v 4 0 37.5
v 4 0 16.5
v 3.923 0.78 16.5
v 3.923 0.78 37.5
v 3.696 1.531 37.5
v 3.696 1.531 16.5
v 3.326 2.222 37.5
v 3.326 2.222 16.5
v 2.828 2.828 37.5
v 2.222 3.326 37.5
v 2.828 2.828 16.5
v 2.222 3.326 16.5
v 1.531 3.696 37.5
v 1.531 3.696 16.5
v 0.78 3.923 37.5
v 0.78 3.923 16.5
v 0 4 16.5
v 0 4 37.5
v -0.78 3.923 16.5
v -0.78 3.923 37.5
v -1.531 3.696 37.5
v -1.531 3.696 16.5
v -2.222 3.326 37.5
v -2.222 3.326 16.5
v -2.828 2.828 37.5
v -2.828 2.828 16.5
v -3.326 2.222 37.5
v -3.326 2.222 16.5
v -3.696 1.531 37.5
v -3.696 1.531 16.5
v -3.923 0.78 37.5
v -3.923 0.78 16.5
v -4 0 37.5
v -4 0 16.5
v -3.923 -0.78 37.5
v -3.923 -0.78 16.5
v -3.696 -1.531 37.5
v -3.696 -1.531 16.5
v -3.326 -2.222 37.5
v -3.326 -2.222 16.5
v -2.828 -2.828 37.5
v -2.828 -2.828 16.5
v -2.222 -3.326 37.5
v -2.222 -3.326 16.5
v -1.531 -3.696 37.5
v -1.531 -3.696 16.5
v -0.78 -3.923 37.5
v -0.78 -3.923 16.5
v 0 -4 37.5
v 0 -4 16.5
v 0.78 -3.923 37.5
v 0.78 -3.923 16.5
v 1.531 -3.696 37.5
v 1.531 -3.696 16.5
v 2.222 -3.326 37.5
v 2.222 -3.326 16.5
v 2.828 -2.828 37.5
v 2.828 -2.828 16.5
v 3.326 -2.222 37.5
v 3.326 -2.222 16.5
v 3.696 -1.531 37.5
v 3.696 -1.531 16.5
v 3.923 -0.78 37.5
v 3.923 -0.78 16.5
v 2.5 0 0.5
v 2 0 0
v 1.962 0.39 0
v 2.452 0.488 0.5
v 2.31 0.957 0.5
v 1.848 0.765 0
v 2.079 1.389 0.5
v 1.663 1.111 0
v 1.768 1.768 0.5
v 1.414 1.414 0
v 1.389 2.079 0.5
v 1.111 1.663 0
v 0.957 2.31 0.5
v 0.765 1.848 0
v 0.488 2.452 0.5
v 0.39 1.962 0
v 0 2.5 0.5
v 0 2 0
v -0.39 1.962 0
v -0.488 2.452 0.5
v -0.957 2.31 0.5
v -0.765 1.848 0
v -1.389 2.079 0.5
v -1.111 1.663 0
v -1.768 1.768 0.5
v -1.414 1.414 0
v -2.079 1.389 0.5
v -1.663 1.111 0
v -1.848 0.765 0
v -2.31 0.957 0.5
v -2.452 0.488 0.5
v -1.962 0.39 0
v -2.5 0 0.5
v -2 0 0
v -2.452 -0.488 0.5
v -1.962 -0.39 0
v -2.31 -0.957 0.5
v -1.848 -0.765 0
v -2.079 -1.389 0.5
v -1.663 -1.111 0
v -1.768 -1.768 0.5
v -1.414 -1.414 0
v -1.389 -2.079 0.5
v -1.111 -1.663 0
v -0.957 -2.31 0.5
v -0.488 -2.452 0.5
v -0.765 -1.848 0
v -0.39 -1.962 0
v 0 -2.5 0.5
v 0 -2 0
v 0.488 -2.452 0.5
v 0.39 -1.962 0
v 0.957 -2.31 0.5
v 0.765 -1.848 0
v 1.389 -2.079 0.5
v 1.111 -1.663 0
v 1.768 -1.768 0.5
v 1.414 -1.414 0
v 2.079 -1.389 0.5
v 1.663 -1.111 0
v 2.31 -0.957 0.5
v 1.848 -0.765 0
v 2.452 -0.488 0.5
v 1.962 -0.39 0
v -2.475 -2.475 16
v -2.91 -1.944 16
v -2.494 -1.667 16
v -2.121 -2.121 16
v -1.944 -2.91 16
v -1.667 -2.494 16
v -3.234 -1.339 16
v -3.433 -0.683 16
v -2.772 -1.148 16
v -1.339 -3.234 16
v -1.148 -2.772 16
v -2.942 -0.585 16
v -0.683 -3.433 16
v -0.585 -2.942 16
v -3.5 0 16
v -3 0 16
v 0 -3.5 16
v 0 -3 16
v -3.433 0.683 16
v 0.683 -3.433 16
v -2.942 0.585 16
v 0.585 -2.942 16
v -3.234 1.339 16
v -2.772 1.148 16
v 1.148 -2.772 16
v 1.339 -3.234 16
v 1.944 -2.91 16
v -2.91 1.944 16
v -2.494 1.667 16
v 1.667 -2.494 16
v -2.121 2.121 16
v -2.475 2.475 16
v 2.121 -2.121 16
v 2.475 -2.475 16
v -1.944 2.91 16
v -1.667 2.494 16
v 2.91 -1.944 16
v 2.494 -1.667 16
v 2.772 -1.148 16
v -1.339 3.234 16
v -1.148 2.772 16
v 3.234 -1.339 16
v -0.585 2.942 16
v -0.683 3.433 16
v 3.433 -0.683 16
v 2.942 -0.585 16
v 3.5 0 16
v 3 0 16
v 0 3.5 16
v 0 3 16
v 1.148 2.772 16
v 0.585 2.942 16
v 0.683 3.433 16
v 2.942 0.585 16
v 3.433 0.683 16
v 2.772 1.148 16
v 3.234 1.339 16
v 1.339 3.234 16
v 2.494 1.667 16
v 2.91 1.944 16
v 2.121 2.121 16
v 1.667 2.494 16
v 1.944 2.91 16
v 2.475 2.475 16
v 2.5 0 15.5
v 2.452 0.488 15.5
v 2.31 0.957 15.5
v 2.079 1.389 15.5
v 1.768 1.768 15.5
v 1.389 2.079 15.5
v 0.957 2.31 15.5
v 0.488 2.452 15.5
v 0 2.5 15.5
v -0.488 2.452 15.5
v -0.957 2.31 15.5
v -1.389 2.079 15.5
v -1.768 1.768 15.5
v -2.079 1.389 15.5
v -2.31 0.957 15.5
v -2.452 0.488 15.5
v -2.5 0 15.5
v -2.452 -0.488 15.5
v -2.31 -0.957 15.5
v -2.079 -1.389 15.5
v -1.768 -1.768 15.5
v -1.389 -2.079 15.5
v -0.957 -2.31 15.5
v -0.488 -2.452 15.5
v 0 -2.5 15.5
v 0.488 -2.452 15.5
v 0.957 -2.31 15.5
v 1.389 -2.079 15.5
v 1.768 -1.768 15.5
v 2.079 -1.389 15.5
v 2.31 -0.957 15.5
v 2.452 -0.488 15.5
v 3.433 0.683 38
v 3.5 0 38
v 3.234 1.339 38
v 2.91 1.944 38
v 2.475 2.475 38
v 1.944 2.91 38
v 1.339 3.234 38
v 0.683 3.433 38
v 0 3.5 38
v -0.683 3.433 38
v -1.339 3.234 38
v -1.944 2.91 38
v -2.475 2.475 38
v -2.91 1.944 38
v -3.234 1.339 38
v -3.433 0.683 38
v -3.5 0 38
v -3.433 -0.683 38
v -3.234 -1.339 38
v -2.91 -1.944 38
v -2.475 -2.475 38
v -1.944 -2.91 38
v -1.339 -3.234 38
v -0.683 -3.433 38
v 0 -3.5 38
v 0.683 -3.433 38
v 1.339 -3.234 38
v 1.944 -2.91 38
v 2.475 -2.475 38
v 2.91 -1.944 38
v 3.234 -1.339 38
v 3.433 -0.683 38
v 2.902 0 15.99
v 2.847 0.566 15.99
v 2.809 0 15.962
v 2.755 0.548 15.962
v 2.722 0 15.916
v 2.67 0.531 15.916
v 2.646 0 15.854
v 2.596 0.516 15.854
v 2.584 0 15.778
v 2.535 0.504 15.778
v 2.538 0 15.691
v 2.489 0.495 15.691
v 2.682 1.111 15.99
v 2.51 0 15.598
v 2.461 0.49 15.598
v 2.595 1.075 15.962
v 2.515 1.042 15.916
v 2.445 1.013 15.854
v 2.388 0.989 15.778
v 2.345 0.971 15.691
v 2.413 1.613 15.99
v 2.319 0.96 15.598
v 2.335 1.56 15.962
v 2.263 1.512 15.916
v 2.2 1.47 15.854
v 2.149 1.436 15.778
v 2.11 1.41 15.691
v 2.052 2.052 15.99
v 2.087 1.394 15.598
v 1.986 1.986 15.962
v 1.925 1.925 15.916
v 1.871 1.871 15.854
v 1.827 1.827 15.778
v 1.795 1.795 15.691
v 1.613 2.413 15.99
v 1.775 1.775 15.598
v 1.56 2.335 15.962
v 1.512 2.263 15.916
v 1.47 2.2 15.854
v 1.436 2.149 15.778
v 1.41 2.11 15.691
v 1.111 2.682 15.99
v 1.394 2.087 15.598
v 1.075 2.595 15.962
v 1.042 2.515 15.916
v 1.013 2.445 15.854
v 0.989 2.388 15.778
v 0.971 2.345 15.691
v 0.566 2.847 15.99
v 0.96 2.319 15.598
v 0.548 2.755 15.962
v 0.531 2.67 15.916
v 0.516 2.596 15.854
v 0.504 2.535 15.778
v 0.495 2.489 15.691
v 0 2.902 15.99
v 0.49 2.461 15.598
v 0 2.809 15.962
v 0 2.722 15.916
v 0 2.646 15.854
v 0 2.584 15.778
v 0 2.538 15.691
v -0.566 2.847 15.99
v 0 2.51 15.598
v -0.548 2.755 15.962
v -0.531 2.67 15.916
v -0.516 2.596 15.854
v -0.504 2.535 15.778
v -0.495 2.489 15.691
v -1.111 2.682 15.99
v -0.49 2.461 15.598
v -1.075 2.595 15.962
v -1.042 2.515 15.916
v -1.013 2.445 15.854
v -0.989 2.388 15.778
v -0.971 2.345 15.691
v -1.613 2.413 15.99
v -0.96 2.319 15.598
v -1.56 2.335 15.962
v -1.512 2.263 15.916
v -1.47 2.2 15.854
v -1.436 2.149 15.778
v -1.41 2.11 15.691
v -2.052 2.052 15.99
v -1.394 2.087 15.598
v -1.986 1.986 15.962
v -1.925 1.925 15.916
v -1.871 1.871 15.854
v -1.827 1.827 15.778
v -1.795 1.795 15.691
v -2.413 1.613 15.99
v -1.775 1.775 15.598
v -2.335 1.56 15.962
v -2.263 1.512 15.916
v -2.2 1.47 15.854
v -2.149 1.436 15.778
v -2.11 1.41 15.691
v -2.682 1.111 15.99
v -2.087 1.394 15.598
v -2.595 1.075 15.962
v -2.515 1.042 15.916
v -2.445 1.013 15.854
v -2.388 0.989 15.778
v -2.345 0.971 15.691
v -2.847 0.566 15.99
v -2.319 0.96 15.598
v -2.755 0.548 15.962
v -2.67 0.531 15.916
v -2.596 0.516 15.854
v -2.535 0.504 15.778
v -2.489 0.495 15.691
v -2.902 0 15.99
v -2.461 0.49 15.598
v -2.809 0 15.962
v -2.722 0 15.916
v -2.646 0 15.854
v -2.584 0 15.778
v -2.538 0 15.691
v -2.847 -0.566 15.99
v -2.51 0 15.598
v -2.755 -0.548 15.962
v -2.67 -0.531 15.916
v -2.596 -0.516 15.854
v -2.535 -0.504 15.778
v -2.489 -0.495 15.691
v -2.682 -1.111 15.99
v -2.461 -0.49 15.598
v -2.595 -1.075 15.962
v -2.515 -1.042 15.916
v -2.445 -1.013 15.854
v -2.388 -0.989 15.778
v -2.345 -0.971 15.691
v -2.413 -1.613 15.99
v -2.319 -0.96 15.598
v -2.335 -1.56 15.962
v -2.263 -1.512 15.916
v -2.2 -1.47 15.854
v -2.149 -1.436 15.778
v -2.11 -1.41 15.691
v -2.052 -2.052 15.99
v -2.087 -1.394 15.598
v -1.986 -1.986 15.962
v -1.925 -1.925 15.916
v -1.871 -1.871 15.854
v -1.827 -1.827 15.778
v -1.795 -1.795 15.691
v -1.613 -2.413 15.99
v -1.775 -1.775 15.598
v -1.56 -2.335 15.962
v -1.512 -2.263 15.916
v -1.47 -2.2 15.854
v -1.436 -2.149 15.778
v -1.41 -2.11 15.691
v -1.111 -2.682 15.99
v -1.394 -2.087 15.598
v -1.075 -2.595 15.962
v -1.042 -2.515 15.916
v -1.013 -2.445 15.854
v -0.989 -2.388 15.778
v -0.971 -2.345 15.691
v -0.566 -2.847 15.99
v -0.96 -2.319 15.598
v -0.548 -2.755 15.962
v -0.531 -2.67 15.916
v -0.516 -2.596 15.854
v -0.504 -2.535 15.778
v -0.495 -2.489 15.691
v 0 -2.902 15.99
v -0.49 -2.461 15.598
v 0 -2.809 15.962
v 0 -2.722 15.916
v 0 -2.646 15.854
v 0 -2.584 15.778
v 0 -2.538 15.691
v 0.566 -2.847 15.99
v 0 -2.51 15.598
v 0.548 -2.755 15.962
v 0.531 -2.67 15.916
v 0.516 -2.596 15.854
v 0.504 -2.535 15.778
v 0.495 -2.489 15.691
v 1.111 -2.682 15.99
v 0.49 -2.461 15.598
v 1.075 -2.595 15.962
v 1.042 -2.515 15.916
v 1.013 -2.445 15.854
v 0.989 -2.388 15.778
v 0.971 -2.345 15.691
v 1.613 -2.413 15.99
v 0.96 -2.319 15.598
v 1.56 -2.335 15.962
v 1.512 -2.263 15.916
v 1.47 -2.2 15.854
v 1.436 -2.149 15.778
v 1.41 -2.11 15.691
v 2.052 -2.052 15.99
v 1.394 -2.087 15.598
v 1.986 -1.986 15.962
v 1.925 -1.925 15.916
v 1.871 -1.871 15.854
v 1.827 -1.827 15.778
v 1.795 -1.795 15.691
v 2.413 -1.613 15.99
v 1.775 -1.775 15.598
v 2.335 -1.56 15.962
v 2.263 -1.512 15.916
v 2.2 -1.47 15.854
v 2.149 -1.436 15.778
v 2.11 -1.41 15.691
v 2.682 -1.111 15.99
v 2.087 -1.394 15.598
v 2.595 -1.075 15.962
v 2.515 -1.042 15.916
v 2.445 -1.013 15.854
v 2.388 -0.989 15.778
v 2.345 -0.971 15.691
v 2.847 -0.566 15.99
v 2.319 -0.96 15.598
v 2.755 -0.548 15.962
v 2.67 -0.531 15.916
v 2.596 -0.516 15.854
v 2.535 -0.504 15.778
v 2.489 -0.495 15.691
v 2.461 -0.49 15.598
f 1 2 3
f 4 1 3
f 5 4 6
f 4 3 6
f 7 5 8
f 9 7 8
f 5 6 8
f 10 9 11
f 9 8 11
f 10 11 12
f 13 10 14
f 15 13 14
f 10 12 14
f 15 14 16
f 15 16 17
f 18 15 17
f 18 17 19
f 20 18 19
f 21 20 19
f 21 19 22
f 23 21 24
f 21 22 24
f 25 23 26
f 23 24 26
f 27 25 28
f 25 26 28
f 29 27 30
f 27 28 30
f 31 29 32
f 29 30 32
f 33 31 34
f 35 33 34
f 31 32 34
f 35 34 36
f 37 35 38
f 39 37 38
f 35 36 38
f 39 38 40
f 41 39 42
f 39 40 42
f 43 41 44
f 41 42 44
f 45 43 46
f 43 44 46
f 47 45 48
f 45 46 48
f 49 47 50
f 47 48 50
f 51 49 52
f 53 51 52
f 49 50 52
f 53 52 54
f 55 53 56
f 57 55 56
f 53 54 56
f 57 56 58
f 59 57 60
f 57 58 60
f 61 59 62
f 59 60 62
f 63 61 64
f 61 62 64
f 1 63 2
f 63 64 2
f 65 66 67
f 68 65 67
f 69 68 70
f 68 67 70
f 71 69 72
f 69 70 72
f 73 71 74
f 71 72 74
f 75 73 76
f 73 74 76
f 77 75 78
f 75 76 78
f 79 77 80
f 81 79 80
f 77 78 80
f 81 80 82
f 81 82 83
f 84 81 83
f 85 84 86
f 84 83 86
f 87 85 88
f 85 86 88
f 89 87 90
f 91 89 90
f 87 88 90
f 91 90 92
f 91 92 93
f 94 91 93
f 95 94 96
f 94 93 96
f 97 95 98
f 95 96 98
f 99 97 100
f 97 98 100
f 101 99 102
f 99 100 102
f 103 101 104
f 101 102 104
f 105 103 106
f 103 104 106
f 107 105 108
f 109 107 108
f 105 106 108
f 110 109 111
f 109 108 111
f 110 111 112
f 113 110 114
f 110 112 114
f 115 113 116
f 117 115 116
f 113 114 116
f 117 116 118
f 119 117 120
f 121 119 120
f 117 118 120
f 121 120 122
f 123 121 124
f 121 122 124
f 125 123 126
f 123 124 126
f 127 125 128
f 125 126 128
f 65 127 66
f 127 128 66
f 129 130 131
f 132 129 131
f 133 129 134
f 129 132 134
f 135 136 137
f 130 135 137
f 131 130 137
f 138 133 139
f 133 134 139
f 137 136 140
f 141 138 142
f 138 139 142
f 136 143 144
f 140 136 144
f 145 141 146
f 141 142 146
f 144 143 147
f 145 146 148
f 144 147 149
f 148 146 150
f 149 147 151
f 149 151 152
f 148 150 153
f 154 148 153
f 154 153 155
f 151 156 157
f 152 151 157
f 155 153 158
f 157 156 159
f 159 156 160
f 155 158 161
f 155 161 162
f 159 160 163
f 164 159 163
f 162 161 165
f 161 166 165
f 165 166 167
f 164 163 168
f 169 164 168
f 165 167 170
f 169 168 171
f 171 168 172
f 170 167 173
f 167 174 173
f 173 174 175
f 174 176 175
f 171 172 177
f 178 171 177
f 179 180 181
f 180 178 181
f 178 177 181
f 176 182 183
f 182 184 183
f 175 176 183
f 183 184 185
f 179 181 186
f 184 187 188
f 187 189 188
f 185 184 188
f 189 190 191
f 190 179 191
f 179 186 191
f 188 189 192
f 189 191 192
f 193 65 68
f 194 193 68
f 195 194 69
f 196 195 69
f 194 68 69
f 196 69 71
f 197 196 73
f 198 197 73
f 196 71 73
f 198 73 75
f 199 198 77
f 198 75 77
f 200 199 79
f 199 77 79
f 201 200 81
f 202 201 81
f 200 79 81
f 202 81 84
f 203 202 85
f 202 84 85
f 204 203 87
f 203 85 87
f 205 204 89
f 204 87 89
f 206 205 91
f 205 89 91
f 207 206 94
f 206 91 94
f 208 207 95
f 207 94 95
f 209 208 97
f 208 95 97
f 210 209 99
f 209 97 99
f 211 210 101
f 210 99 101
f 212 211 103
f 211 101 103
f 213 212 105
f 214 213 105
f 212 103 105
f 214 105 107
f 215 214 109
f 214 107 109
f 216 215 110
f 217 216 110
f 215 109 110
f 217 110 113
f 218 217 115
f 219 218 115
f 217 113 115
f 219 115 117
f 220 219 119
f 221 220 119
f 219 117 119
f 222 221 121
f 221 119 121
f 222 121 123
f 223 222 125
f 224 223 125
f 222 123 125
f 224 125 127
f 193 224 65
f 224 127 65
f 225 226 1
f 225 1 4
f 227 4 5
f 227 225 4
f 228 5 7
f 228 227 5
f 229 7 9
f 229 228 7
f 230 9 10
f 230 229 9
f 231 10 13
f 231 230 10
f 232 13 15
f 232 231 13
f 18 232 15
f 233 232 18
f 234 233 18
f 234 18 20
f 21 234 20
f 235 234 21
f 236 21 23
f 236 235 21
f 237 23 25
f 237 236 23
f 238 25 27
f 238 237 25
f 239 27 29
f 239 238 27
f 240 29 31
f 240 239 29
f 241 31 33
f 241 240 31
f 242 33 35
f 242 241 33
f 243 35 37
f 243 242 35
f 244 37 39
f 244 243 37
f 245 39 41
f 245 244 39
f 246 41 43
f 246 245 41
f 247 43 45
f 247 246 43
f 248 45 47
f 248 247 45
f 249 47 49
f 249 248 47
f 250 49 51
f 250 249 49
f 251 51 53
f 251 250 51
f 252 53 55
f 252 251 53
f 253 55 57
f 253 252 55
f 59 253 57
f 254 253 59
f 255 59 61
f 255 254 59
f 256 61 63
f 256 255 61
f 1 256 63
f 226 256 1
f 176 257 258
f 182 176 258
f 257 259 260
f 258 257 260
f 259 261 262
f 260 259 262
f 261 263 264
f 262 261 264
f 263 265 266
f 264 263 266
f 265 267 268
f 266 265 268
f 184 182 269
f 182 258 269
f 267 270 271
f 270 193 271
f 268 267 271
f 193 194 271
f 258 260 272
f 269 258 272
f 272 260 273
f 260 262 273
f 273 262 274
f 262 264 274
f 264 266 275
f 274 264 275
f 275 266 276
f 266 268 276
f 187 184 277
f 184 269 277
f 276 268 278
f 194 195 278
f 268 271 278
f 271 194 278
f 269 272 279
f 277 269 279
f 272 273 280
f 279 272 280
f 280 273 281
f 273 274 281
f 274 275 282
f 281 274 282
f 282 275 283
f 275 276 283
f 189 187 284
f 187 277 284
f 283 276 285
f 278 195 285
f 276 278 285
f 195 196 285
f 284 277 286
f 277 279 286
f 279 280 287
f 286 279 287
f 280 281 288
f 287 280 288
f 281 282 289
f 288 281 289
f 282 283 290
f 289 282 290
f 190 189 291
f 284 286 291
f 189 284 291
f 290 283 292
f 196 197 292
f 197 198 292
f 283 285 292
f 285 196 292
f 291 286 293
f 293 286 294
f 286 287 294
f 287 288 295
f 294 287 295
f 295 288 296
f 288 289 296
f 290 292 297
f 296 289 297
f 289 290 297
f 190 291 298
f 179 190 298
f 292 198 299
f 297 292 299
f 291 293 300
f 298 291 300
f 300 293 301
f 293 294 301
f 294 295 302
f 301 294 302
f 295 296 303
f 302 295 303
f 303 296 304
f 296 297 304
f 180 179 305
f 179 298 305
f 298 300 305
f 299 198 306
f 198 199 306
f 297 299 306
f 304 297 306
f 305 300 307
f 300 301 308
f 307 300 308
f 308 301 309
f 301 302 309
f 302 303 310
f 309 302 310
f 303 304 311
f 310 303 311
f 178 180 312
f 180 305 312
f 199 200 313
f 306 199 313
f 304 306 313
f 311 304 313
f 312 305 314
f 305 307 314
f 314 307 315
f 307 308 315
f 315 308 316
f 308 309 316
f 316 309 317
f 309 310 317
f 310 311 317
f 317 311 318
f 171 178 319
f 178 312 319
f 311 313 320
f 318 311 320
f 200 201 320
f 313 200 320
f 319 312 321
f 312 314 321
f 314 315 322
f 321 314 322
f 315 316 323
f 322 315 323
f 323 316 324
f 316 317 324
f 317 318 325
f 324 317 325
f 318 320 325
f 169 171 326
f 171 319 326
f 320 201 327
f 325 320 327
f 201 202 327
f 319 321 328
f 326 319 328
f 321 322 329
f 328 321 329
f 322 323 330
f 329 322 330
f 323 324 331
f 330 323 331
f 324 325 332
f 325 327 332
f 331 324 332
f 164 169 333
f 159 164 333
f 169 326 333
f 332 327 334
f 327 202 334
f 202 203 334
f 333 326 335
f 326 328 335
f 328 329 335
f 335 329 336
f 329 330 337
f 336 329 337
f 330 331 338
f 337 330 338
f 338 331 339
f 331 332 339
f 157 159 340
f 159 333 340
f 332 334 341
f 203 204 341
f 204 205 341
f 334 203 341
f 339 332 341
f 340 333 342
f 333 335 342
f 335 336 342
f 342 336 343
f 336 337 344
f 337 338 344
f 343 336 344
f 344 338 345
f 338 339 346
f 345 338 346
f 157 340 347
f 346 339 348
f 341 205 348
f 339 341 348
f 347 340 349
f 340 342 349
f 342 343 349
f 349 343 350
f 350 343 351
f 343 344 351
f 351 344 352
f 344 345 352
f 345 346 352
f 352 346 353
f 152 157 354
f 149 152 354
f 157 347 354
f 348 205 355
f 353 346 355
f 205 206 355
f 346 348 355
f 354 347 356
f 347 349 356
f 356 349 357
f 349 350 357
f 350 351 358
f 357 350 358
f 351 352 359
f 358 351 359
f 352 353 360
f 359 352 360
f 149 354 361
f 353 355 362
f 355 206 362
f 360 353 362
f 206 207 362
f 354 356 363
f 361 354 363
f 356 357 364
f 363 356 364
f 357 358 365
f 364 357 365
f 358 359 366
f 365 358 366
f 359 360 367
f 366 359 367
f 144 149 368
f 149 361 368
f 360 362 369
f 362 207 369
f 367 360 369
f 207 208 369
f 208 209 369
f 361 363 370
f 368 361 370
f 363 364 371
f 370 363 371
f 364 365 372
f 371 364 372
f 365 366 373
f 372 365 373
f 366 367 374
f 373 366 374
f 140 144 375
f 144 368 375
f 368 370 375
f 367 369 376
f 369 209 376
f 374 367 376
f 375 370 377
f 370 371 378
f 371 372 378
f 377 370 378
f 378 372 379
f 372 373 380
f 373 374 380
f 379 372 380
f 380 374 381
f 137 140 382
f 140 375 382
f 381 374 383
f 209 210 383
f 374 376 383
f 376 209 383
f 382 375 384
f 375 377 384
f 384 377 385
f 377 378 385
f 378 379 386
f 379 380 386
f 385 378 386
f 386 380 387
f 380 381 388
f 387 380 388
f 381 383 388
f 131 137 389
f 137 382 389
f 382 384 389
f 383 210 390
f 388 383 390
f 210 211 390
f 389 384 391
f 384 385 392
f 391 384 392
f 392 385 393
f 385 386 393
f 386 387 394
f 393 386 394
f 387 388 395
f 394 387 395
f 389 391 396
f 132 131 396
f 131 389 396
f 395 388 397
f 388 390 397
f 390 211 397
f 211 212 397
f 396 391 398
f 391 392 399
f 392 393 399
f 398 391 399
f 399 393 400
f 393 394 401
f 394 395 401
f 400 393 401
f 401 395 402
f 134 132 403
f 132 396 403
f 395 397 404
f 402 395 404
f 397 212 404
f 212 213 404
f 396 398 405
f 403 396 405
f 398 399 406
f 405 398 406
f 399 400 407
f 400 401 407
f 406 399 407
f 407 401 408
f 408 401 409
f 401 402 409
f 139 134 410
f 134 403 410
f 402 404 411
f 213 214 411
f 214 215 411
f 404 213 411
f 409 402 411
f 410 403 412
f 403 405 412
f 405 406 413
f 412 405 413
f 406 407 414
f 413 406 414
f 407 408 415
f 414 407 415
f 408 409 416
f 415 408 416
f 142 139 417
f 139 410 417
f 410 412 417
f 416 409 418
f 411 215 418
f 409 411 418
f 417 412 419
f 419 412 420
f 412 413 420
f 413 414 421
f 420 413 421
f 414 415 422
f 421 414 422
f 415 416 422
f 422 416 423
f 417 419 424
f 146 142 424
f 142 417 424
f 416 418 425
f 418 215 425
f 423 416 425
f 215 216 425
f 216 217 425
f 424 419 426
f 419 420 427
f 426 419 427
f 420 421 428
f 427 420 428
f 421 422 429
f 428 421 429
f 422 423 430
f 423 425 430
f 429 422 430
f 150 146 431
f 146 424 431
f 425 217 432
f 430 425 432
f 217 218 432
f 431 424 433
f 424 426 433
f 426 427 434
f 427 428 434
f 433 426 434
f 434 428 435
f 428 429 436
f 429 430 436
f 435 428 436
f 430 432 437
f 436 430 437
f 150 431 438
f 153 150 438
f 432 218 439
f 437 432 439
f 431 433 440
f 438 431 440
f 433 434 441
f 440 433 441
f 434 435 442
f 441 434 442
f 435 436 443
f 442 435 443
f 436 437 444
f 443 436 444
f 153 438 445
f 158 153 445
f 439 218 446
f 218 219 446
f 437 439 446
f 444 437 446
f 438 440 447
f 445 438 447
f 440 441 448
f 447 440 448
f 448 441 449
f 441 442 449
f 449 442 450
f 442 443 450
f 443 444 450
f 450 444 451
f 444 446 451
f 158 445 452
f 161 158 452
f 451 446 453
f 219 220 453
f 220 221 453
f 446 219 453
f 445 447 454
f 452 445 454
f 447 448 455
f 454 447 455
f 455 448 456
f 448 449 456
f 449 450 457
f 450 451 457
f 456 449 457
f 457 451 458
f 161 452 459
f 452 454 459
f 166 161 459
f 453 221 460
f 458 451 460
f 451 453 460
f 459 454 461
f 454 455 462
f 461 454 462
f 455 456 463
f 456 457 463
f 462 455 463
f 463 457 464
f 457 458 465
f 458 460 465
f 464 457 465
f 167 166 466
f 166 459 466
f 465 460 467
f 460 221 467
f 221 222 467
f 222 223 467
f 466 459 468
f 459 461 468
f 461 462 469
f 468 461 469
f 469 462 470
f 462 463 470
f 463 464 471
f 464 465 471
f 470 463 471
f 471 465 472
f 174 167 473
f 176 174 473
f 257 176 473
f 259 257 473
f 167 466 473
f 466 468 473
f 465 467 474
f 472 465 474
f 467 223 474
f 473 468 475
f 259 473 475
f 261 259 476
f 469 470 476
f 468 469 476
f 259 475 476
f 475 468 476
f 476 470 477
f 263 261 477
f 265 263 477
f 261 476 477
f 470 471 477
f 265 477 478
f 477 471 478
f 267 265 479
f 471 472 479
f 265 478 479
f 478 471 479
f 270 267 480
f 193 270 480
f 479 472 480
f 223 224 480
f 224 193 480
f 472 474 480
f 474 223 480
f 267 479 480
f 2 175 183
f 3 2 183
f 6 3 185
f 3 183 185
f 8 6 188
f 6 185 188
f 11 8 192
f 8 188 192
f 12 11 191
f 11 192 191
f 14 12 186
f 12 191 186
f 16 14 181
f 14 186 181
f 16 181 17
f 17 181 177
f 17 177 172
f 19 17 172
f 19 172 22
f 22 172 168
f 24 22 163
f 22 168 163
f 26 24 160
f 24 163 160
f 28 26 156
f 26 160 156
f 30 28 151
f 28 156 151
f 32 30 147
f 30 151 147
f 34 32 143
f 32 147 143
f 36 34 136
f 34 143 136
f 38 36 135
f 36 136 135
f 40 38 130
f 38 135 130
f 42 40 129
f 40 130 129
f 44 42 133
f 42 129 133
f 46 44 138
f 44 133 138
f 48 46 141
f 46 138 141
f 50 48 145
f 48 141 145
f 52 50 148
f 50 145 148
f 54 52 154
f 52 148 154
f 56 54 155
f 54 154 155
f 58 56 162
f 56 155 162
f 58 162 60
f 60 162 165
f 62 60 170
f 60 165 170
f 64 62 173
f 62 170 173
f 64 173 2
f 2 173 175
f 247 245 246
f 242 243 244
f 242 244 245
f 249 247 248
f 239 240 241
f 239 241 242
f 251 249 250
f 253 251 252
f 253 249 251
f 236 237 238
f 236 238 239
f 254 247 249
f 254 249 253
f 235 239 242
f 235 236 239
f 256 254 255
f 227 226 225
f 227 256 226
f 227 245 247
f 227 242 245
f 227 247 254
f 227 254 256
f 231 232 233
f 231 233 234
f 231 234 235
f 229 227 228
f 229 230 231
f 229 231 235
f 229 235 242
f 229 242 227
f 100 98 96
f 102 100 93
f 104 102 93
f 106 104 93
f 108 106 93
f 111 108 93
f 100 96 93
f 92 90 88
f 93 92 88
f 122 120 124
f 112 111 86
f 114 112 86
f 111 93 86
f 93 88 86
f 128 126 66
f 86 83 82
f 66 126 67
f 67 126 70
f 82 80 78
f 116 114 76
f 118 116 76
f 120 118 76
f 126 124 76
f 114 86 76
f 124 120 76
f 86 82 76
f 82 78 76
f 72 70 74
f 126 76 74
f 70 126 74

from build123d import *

# Parameters (mm, degrees)
SKETCH1_R           = 2.5
BOSS_EXTRUDE1_DEPTH = 16
SKETCH2_R           = 4
BOSS_EXTRUDE2_DEPTH = 22
CHAMFER1_SIZE       = 0.5
FILLET1_R           = 0.5


with BuildPart() as part:
    # Sketch1 → Boss-Extrude1 (new body)
    with BuildSketch(Plane.XY):
        Circle(SKETCH1_R)
    extrude(amount=BOSS_EXTRUDE1_DEPTH)

    # Sketch2 → Boss-Extrude2 (add)
    with BuildSketch(Plane.XY.offset(16)):
        Circle(SKETCH2_R)
    extrude(amount=BOSS_EXTRUDE2_DEPTH)

    # Chamfer1
    chamfer1_edges = [part.edges().sort_by_distance(p)[0] for p in [
        (-2.5, 0, 0),
        (-4, 0, 16),
        (-4, 0, 38),
    ]]
    chamfer(chamfer1_edges, length=CHAMFER1_SIZE)

    # Fillet1
    fillet1_edges = [part.edges().sort_by_distance(p)[0] for p in [
        (-2.5, 0, 16),
    ]]
    fillet(fillet1_edges, radius=FILLET1_R)


solid = part.part
